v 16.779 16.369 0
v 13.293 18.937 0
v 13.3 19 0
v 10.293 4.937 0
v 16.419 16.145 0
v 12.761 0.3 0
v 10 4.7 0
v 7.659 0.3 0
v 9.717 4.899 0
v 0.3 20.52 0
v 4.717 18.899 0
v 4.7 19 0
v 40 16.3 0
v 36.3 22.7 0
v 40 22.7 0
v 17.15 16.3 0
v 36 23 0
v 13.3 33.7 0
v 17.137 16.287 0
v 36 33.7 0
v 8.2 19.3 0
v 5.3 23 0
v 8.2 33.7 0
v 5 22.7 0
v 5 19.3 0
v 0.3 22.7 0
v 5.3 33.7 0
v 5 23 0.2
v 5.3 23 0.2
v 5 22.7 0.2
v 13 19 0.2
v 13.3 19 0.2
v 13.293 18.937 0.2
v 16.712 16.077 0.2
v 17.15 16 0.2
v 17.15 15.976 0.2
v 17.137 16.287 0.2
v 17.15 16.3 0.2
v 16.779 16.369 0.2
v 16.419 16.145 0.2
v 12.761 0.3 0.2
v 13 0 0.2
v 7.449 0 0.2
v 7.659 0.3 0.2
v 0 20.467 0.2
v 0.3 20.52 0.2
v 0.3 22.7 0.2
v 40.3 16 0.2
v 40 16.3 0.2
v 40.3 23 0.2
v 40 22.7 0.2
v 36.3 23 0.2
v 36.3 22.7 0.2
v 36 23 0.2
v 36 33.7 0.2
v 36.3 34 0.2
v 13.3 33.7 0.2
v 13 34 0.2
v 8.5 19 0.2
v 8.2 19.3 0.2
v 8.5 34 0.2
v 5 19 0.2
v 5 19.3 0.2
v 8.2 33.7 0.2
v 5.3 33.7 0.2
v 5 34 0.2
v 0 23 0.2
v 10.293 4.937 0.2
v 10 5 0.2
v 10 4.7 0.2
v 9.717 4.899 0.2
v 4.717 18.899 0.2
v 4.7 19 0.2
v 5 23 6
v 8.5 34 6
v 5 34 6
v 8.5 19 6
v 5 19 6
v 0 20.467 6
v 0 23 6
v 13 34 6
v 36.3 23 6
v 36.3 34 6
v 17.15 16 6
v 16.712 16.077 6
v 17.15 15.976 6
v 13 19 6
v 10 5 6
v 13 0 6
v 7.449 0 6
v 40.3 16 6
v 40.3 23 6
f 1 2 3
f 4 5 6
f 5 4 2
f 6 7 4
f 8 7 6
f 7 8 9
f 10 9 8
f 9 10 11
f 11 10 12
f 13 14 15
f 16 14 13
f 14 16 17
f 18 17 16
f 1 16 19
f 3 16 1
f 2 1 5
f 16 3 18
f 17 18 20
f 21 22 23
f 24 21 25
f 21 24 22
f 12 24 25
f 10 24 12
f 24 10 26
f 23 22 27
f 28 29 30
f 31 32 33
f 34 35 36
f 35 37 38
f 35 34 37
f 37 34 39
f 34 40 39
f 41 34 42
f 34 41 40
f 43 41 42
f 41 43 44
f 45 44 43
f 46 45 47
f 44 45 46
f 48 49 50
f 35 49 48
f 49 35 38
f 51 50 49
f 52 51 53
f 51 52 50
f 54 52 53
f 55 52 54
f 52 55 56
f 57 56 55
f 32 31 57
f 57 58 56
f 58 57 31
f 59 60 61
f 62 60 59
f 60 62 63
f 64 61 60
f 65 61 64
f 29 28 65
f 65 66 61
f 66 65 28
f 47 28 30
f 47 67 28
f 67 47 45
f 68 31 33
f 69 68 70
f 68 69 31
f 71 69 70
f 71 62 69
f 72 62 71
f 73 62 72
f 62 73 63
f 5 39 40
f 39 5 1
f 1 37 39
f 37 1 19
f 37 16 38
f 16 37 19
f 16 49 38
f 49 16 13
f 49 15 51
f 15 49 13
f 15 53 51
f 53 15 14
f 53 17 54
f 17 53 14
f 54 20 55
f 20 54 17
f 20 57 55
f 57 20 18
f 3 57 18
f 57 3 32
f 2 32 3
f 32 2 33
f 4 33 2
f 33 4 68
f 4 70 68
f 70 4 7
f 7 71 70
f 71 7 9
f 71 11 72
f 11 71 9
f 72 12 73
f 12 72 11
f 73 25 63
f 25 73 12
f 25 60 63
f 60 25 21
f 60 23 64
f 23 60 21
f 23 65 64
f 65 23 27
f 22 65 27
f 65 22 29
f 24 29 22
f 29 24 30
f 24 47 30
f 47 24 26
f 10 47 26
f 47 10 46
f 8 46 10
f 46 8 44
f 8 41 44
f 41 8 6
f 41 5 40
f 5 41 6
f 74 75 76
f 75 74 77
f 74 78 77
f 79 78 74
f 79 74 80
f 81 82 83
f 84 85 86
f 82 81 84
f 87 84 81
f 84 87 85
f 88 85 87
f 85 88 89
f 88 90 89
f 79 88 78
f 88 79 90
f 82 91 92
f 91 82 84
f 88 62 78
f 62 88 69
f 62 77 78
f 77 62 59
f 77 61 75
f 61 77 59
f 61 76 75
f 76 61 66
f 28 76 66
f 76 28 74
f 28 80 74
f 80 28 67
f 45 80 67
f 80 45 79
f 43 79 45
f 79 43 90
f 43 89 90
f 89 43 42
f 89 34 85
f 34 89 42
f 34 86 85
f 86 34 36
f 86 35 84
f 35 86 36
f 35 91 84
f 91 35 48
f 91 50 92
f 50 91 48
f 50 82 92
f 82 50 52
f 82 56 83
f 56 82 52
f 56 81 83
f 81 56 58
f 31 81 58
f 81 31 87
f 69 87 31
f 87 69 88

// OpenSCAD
eps = 0.0001;

top_width = 32;
expanded_width = 40.3;
max_height = 30;

module profile() {
  difference() {
    square([expanded_width, max_height + 4]);
    
    translate([expanded_width/2 - 3, max_height-114])
      square(100);
    
    translate([-95, max_height-7])
      square(100);
    
    translate([expanded_width-4, max_height-7])
      square(100);
    
    rotate([0, 0, 20])
      translate([-93, -50])
        square(100);
    
    hull() {
      translate([5, 0]) {
        translate([0, 19])
          square([8, eps]);
        translate([5, 5])
          square([eps, eps]);
      }
    }
    
    translate([8.5, 19])
      square([4.5, 100]);
    
    translate([13, 0])
      rotate([0, 0, -13])
        square(16.5);
  }
}

height = 6;

linear_extrude(0.2)
  offset(-0.3)
    profile();
translate([0, 0, 0.2])
  linear_extrude(height-0.2)
    profile();
